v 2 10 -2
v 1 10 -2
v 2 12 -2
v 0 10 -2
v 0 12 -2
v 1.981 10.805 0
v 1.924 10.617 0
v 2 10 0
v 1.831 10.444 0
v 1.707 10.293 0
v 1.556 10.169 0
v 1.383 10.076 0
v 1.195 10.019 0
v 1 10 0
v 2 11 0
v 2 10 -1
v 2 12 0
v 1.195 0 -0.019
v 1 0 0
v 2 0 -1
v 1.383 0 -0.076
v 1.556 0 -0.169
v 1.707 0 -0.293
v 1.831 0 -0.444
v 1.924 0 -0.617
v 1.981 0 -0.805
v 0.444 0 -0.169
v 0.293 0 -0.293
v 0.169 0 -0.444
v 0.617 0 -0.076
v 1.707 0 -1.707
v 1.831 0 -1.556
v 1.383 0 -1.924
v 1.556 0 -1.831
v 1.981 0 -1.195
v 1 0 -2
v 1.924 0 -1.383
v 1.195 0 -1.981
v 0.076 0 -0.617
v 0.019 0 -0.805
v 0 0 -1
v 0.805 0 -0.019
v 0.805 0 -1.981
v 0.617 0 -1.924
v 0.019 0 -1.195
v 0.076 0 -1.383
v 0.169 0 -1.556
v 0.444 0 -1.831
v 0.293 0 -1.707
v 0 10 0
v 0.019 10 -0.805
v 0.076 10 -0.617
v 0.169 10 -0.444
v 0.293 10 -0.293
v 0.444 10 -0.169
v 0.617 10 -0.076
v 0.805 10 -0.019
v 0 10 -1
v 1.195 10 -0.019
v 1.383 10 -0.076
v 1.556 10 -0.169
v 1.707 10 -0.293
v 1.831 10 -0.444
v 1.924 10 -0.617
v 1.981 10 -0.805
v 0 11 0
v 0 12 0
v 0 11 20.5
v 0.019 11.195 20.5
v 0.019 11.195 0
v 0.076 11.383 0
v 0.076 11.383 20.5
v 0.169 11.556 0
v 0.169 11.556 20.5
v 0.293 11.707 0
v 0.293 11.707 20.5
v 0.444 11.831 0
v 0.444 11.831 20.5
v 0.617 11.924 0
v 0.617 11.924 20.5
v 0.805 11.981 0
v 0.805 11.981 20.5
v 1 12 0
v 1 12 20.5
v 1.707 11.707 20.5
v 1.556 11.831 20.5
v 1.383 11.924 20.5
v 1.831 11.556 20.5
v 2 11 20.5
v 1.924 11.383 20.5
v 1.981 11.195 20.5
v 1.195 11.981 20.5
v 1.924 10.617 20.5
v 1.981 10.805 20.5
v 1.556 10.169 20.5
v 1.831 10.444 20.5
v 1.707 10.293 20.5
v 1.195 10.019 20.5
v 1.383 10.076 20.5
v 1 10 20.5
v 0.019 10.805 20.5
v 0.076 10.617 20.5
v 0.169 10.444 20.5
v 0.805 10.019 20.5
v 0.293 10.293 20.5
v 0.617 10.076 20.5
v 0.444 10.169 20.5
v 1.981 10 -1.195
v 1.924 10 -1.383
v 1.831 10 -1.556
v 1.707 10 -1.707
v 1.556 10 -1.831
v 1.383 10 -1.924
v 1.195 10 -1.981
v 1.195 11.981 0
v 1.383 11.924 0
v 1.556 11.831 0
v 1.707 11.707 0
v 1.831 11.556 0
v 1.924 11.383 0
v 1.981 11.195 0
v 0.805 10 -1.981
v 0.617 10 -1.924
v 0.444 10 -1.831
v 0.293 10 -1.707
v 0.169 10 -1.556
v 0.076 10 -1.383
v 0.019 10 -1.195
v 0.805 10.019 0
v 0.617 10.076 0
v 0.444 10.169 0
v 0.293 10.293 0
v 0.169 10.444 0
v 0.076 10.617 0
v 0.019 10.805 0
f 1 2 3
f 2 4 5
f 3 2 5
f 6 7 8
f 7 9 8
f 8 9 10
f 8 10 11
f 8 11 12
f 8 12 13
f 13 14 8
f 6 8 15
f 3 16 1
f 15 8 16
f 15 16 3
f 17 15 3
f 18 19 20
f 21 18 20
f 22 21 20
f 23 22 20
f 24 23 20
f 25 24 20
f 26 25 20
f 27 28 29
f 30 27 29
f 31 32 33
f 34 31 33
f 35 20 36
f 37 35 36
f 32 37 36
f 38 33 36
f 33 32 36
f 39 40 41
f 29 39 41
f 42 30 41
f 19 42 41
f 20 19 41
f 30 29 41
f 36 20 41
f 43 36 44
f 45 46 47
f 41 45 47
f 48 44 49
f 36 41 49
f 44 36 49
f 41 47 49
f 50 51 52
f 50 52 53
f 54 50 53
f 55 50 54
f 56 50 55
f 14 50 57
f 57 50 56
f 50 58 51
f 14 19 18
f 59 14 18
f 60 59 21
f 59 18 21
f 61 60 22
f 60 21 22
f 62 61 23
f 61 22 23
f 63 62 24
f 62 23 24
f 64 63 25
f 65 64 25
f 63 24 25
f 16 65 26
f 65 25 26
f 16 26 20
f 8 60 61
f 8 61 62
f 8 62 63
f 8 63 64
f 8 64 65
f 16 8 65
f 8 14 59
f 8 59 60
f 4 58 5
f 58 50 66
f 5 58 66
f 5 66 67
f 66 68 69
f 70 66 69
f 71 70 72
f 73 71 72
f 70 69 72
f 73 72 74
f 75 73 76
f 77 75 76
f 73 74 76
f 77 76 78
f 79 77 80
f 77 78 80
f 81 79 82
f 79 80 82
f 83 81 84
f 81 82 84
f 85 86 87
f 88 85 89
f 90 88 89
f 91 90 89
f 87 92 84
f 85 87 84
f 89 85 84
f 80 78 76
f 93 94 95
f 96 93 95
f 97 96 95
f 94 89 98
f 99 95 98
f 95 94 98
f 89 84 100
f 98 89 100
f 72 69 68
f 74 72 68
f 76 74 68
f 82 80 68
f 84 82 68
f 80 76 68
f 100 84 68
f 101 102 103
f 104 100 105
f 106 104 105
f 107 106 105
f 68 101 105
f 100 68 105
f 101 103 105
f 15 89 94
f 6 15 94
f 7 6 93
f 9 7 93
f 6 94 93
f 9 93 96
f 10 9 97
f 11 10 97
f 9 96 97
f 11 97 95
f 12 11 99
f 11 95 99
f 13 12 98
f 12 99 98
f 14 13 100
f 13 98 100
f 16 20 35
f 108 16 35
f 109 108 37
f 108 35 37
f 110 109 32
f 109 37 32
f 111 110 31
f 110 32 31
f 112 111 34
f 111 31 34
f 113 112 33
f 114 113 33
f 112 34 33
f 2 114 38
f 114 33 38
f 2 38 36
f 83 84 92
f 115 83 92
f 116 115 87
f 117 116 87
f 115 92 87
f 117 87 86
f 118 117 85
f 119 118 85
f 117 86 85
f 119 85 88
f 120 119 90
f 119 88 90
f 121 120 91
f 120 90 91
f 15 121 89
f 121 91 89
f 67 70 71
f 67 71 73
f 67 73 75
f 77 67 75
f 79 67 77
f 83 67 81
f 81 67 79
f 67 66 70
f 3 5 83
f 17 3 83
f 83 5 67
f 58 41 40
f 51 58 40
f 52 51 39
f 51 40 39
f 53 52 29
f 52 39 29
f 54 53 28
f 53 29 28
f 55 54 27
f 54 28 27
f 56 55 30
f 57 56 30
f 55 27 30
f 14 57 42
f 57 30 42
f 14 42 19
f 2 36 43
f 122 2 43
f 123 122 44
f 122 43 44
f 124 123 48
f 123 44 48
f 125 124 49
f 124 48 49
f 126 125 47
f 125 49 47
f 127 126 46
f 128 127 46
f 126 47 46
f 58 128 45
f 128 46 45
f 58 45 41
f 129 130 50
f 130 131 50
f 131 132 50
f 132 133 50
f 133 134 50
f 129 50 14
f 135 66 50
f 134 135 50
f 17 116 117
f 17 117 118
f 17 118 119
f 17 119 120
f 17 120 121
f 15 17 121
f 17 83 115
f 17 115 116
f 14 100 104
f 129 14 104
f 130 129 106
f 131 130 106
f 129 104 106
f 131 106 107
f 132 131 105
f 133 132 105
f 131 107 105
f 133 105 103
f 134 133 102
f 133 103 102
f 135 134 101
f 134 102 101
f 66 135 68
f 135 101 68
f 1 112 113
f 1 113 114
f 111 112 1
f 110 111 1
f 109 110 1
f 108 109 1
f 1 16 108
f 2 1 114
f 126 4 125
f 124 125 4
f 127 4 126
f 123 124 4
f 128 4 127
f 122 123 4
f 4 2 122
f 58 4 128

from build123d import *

# Parameters (mm, degrees)
F1_DEPTH = 2
F3_DEPTH = 20.5
F5_DEPTH = 10


with BuildPart() as f1:
    # F0 (on Right) → F1 (new body)
    with BuildSketch(Plane.YZ):
        Polygon((10, 0), (0, 0), (0, -2), (12, -2), (12, 20.5), (10, 20.5), align=None)
    extrude(amount=F1_DEPTH)

    # F2 (on face) → F3 (cut)
    with BuildSketch(Plane.XY.offset(20.5)):
        with BuildLine():
            ThreePointArc((0, 11), (0.292893, 11.707107), (1, 12))
            Line((1, 12), (0, 12))
            Line((0, 12), (0, 11))
        make_face()
        with BuildLine():
            ThreePointArc((1, 12), (1.707107, 11.707107), (2, 11))
            Line((2, 11), (2, 12))
            Line((2, 12), (1, 12))
        make_face()
        with BuildLine():
            Line((2, 10), (2, 11))
            ThreePointArc((2, 11), (1.707107, 10.292893), (1, 10))
            Line((1, 10), (2, 10))
        make_face()
        with BuildLine():
            Line((0, 10), (1, 10))
            ThreePointArc((1, 10), (0.292893, 10.292893), (0, 11))
            Line((0, 11), (0, 10))
        make_face()
    extrude(amount=-F3_DEPTH, mode=Mode.SUBTRACT)

    # F4 (on face) → F5 (cut)
    with BuildSketch(Plane.XZ):
        with BuildLine():
            Line((0, -2), (1, -2))
            ThreePointArc((1, -2), (0.292893, -1.707107), (0, -1))
            Line((0, -1), (0, -2))
        make_face()
        with BuildLine():
            Line((2, -2), (2, -1))
            ThreePointArc((2, -1), (1.707107, -1.707107), (1, -2))
            Line((1, -2), (2, -2))
        make_face()
        with BuildLine():
            ThreePointArc((1, 0), (1.707107, -0.292893), (2, -1))
            Line((2, -1), (2, 0))
            Line((2, 0), (1, 0))
        make_face()
        with BuildLine():
            ThreePointArc((0, -1), (0.292893, -0.292893), (1, 0))
            Line((1, 0), (0, 0))
            Line((0, 0), (0, -1))
        make_face()
    extrude(amount=-F5_DEPTH, mode=Mode.SUBTRACT)


solid = f1.part
